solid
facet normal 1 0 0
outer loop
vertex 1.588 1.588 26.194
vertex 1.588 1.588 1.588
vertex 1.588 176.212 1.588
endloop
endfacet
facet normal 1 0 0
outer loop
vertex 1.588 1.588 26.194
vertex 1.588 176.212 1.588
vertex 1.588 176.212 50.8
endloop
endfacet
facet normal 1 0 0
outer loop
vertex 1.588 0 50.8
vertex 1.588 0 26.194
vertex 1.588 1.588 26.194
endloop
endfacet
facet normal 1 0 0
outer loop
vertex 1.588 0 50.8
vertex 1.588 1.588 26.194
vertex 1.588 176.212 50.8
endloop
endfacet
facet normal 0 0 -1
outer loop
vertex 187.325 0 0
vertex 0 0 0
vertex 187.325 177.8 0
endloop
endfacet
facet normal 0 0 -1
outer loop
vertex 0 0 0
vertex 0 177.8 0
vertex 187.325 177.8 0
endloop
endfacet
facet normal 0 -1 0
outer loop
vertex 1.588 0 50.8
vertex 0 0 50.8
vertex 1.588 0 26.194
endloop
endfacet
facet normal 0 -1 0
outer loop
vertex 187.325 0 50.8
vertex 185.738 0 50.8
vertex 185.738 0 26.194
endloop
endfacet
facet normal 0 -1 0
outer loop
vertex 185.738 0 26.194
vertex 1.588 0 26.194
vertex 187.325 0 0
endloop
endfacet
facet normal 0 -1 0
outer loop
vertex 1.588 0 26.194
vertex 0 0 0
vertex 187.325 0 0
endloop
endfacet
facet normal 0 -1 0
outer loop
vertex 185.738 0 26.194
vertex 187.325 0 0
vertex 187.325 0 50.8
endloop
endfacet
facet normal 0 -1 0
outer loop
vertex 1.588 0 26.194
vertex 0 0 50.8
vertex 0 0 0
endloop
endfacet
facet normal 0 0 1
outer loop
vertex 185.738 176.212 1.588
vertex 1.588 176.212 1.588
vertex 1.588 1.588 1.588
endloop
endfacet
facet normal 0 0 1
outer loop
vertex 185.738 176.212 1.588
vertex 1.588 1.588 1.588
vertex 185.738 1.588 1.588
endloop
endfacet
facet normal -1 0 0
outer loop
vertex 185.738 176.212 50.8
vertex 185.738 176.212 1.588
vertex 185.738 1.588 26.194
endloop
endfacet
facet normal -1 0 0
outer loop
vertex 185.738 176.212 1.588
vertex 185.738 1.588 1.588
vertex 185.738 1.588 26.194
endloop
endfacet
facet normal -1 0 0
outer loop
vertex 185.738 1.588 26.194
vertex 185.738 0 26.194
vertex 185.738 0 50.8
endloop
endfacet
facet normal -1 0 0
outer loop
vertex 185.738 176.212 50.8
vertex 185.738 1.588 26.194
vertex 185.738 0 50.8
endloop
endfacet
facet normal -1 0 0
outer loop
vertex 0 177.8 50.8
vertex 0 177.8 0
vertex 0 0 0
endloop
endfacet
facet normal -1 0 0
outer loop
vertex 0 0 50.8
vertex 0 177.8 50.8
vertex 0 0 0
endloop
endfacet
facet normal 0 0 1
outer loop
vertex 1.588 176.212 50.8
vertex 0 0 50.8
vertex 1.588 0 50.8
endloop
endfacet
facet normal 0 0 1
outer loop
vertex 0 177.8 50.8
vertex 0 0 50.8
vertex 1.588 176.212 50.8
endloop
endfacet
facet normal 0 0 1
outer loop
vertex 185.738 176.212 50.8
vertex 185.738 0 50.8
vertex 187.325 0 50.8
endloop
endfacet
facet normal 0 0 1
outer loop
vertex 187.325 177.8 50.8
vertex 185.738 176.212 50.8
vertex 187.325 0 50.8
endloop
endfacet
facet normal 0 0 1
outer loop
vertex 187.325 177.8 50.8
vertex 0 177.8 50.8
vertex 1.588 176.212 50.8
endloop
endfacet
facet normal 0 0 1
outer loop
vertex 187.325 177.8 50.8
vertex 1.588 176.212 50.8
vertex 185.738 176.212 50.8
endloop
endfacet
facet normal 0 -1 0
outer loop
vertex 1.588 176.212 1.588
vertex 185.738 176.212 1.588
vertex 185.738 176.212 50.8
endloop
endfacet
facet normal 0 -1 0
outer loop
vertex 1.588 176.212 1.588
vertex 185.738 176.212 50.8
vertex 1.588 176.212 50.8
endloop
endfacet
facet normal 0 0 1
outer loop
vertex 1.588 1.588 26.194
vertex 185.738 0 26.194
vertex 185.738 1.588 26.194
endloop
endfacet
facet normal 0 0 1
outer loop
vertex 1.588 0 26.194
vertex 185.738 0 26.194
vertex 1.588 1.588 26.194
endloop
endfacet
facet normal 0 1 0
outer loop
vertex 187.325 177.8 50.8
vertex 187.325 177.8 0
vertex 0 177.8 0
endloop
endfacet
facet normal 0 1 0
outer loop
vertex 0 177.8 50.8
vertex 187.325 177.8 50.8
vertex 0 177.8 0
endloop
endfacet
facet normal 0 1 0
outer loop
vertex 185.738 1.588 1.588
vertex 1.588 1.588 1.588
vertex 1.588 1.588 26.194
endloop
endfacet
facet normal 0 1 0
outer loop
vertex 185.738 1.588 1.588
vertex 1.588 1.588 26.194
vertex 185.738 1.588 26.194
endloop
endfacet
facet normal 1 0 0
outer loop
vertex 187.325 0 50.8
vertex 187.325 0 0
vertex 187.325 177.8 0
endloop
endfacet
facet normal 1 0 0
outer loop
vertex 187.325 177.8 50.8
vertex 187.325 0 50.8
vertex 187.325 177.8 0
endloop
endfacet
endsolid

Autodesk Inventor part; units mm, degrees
ref_plane "YZ Plane" through (0, 0, 0) normal (1, 0, 0) x (0, 1, 0)
ref_plane "XZ Plane" through (0, 0, 0) normal (0, 1, 0) x (-1, 0, 0)
ref_plane "XY Plane" through (0, 0, 0) normal (0, 0, 1) x (1, 0, 0)
sketch "Sketch1" plane through (0, 0, 0) normal (0, 0, 1) x (1, 0, 0)
  line L0 (0, 0) -> (187.325, 0)
  line L1 (187.325, 0) -> (187.325, 177.8)
  line L2 (187.325, 177.8) -> (0, 177.8)
  line L3 (0, 177.8) -> (0, 0)
  dimension "d0" = 177.8
  dimension "d1" = 187.325
extrude "Extrusion1" add sketch "Sketch1" along normal blind 50.8
shell "Shell1" thickness 1.5875 removed faces 1 at (124.8833, 59.2667, 50.8)
sketch "Sketch2" plane through (0, 0, 0) normal (0, -1, 0) x (1, 0, 0)
  line L0 (185.7375, 1.5875) -> (185.7375, 50.8) projected
  line L1 (1.5875, 50.8) -> (185.7375, 50.8)
  line L2 (185.7375, 50.8) -> (185.7375, 26.1937)
  line L3 (185.7375, 26.1937) -> (1.5875, 26.1937)
  line L4 (1.5875, 26.1937) -> (1.5875, 50.8)
  line L5 (1.5875, 1.5875) -> (1.5875, 50.8) projected
  line L6 (0, 50.8) -> (187.325, 50.8) projected
  point P0 (0, 0)
  point P1 (1.5875, 26.1937)
  point P2 (93.6625, 50.8)
extrude "Extrusion2" cut sketch "Sketch2" against normal up to surface (1.5875 mm away)
properties part number "BatteryHolder-ver1-1111-2019" material "Aluminum 6061"
